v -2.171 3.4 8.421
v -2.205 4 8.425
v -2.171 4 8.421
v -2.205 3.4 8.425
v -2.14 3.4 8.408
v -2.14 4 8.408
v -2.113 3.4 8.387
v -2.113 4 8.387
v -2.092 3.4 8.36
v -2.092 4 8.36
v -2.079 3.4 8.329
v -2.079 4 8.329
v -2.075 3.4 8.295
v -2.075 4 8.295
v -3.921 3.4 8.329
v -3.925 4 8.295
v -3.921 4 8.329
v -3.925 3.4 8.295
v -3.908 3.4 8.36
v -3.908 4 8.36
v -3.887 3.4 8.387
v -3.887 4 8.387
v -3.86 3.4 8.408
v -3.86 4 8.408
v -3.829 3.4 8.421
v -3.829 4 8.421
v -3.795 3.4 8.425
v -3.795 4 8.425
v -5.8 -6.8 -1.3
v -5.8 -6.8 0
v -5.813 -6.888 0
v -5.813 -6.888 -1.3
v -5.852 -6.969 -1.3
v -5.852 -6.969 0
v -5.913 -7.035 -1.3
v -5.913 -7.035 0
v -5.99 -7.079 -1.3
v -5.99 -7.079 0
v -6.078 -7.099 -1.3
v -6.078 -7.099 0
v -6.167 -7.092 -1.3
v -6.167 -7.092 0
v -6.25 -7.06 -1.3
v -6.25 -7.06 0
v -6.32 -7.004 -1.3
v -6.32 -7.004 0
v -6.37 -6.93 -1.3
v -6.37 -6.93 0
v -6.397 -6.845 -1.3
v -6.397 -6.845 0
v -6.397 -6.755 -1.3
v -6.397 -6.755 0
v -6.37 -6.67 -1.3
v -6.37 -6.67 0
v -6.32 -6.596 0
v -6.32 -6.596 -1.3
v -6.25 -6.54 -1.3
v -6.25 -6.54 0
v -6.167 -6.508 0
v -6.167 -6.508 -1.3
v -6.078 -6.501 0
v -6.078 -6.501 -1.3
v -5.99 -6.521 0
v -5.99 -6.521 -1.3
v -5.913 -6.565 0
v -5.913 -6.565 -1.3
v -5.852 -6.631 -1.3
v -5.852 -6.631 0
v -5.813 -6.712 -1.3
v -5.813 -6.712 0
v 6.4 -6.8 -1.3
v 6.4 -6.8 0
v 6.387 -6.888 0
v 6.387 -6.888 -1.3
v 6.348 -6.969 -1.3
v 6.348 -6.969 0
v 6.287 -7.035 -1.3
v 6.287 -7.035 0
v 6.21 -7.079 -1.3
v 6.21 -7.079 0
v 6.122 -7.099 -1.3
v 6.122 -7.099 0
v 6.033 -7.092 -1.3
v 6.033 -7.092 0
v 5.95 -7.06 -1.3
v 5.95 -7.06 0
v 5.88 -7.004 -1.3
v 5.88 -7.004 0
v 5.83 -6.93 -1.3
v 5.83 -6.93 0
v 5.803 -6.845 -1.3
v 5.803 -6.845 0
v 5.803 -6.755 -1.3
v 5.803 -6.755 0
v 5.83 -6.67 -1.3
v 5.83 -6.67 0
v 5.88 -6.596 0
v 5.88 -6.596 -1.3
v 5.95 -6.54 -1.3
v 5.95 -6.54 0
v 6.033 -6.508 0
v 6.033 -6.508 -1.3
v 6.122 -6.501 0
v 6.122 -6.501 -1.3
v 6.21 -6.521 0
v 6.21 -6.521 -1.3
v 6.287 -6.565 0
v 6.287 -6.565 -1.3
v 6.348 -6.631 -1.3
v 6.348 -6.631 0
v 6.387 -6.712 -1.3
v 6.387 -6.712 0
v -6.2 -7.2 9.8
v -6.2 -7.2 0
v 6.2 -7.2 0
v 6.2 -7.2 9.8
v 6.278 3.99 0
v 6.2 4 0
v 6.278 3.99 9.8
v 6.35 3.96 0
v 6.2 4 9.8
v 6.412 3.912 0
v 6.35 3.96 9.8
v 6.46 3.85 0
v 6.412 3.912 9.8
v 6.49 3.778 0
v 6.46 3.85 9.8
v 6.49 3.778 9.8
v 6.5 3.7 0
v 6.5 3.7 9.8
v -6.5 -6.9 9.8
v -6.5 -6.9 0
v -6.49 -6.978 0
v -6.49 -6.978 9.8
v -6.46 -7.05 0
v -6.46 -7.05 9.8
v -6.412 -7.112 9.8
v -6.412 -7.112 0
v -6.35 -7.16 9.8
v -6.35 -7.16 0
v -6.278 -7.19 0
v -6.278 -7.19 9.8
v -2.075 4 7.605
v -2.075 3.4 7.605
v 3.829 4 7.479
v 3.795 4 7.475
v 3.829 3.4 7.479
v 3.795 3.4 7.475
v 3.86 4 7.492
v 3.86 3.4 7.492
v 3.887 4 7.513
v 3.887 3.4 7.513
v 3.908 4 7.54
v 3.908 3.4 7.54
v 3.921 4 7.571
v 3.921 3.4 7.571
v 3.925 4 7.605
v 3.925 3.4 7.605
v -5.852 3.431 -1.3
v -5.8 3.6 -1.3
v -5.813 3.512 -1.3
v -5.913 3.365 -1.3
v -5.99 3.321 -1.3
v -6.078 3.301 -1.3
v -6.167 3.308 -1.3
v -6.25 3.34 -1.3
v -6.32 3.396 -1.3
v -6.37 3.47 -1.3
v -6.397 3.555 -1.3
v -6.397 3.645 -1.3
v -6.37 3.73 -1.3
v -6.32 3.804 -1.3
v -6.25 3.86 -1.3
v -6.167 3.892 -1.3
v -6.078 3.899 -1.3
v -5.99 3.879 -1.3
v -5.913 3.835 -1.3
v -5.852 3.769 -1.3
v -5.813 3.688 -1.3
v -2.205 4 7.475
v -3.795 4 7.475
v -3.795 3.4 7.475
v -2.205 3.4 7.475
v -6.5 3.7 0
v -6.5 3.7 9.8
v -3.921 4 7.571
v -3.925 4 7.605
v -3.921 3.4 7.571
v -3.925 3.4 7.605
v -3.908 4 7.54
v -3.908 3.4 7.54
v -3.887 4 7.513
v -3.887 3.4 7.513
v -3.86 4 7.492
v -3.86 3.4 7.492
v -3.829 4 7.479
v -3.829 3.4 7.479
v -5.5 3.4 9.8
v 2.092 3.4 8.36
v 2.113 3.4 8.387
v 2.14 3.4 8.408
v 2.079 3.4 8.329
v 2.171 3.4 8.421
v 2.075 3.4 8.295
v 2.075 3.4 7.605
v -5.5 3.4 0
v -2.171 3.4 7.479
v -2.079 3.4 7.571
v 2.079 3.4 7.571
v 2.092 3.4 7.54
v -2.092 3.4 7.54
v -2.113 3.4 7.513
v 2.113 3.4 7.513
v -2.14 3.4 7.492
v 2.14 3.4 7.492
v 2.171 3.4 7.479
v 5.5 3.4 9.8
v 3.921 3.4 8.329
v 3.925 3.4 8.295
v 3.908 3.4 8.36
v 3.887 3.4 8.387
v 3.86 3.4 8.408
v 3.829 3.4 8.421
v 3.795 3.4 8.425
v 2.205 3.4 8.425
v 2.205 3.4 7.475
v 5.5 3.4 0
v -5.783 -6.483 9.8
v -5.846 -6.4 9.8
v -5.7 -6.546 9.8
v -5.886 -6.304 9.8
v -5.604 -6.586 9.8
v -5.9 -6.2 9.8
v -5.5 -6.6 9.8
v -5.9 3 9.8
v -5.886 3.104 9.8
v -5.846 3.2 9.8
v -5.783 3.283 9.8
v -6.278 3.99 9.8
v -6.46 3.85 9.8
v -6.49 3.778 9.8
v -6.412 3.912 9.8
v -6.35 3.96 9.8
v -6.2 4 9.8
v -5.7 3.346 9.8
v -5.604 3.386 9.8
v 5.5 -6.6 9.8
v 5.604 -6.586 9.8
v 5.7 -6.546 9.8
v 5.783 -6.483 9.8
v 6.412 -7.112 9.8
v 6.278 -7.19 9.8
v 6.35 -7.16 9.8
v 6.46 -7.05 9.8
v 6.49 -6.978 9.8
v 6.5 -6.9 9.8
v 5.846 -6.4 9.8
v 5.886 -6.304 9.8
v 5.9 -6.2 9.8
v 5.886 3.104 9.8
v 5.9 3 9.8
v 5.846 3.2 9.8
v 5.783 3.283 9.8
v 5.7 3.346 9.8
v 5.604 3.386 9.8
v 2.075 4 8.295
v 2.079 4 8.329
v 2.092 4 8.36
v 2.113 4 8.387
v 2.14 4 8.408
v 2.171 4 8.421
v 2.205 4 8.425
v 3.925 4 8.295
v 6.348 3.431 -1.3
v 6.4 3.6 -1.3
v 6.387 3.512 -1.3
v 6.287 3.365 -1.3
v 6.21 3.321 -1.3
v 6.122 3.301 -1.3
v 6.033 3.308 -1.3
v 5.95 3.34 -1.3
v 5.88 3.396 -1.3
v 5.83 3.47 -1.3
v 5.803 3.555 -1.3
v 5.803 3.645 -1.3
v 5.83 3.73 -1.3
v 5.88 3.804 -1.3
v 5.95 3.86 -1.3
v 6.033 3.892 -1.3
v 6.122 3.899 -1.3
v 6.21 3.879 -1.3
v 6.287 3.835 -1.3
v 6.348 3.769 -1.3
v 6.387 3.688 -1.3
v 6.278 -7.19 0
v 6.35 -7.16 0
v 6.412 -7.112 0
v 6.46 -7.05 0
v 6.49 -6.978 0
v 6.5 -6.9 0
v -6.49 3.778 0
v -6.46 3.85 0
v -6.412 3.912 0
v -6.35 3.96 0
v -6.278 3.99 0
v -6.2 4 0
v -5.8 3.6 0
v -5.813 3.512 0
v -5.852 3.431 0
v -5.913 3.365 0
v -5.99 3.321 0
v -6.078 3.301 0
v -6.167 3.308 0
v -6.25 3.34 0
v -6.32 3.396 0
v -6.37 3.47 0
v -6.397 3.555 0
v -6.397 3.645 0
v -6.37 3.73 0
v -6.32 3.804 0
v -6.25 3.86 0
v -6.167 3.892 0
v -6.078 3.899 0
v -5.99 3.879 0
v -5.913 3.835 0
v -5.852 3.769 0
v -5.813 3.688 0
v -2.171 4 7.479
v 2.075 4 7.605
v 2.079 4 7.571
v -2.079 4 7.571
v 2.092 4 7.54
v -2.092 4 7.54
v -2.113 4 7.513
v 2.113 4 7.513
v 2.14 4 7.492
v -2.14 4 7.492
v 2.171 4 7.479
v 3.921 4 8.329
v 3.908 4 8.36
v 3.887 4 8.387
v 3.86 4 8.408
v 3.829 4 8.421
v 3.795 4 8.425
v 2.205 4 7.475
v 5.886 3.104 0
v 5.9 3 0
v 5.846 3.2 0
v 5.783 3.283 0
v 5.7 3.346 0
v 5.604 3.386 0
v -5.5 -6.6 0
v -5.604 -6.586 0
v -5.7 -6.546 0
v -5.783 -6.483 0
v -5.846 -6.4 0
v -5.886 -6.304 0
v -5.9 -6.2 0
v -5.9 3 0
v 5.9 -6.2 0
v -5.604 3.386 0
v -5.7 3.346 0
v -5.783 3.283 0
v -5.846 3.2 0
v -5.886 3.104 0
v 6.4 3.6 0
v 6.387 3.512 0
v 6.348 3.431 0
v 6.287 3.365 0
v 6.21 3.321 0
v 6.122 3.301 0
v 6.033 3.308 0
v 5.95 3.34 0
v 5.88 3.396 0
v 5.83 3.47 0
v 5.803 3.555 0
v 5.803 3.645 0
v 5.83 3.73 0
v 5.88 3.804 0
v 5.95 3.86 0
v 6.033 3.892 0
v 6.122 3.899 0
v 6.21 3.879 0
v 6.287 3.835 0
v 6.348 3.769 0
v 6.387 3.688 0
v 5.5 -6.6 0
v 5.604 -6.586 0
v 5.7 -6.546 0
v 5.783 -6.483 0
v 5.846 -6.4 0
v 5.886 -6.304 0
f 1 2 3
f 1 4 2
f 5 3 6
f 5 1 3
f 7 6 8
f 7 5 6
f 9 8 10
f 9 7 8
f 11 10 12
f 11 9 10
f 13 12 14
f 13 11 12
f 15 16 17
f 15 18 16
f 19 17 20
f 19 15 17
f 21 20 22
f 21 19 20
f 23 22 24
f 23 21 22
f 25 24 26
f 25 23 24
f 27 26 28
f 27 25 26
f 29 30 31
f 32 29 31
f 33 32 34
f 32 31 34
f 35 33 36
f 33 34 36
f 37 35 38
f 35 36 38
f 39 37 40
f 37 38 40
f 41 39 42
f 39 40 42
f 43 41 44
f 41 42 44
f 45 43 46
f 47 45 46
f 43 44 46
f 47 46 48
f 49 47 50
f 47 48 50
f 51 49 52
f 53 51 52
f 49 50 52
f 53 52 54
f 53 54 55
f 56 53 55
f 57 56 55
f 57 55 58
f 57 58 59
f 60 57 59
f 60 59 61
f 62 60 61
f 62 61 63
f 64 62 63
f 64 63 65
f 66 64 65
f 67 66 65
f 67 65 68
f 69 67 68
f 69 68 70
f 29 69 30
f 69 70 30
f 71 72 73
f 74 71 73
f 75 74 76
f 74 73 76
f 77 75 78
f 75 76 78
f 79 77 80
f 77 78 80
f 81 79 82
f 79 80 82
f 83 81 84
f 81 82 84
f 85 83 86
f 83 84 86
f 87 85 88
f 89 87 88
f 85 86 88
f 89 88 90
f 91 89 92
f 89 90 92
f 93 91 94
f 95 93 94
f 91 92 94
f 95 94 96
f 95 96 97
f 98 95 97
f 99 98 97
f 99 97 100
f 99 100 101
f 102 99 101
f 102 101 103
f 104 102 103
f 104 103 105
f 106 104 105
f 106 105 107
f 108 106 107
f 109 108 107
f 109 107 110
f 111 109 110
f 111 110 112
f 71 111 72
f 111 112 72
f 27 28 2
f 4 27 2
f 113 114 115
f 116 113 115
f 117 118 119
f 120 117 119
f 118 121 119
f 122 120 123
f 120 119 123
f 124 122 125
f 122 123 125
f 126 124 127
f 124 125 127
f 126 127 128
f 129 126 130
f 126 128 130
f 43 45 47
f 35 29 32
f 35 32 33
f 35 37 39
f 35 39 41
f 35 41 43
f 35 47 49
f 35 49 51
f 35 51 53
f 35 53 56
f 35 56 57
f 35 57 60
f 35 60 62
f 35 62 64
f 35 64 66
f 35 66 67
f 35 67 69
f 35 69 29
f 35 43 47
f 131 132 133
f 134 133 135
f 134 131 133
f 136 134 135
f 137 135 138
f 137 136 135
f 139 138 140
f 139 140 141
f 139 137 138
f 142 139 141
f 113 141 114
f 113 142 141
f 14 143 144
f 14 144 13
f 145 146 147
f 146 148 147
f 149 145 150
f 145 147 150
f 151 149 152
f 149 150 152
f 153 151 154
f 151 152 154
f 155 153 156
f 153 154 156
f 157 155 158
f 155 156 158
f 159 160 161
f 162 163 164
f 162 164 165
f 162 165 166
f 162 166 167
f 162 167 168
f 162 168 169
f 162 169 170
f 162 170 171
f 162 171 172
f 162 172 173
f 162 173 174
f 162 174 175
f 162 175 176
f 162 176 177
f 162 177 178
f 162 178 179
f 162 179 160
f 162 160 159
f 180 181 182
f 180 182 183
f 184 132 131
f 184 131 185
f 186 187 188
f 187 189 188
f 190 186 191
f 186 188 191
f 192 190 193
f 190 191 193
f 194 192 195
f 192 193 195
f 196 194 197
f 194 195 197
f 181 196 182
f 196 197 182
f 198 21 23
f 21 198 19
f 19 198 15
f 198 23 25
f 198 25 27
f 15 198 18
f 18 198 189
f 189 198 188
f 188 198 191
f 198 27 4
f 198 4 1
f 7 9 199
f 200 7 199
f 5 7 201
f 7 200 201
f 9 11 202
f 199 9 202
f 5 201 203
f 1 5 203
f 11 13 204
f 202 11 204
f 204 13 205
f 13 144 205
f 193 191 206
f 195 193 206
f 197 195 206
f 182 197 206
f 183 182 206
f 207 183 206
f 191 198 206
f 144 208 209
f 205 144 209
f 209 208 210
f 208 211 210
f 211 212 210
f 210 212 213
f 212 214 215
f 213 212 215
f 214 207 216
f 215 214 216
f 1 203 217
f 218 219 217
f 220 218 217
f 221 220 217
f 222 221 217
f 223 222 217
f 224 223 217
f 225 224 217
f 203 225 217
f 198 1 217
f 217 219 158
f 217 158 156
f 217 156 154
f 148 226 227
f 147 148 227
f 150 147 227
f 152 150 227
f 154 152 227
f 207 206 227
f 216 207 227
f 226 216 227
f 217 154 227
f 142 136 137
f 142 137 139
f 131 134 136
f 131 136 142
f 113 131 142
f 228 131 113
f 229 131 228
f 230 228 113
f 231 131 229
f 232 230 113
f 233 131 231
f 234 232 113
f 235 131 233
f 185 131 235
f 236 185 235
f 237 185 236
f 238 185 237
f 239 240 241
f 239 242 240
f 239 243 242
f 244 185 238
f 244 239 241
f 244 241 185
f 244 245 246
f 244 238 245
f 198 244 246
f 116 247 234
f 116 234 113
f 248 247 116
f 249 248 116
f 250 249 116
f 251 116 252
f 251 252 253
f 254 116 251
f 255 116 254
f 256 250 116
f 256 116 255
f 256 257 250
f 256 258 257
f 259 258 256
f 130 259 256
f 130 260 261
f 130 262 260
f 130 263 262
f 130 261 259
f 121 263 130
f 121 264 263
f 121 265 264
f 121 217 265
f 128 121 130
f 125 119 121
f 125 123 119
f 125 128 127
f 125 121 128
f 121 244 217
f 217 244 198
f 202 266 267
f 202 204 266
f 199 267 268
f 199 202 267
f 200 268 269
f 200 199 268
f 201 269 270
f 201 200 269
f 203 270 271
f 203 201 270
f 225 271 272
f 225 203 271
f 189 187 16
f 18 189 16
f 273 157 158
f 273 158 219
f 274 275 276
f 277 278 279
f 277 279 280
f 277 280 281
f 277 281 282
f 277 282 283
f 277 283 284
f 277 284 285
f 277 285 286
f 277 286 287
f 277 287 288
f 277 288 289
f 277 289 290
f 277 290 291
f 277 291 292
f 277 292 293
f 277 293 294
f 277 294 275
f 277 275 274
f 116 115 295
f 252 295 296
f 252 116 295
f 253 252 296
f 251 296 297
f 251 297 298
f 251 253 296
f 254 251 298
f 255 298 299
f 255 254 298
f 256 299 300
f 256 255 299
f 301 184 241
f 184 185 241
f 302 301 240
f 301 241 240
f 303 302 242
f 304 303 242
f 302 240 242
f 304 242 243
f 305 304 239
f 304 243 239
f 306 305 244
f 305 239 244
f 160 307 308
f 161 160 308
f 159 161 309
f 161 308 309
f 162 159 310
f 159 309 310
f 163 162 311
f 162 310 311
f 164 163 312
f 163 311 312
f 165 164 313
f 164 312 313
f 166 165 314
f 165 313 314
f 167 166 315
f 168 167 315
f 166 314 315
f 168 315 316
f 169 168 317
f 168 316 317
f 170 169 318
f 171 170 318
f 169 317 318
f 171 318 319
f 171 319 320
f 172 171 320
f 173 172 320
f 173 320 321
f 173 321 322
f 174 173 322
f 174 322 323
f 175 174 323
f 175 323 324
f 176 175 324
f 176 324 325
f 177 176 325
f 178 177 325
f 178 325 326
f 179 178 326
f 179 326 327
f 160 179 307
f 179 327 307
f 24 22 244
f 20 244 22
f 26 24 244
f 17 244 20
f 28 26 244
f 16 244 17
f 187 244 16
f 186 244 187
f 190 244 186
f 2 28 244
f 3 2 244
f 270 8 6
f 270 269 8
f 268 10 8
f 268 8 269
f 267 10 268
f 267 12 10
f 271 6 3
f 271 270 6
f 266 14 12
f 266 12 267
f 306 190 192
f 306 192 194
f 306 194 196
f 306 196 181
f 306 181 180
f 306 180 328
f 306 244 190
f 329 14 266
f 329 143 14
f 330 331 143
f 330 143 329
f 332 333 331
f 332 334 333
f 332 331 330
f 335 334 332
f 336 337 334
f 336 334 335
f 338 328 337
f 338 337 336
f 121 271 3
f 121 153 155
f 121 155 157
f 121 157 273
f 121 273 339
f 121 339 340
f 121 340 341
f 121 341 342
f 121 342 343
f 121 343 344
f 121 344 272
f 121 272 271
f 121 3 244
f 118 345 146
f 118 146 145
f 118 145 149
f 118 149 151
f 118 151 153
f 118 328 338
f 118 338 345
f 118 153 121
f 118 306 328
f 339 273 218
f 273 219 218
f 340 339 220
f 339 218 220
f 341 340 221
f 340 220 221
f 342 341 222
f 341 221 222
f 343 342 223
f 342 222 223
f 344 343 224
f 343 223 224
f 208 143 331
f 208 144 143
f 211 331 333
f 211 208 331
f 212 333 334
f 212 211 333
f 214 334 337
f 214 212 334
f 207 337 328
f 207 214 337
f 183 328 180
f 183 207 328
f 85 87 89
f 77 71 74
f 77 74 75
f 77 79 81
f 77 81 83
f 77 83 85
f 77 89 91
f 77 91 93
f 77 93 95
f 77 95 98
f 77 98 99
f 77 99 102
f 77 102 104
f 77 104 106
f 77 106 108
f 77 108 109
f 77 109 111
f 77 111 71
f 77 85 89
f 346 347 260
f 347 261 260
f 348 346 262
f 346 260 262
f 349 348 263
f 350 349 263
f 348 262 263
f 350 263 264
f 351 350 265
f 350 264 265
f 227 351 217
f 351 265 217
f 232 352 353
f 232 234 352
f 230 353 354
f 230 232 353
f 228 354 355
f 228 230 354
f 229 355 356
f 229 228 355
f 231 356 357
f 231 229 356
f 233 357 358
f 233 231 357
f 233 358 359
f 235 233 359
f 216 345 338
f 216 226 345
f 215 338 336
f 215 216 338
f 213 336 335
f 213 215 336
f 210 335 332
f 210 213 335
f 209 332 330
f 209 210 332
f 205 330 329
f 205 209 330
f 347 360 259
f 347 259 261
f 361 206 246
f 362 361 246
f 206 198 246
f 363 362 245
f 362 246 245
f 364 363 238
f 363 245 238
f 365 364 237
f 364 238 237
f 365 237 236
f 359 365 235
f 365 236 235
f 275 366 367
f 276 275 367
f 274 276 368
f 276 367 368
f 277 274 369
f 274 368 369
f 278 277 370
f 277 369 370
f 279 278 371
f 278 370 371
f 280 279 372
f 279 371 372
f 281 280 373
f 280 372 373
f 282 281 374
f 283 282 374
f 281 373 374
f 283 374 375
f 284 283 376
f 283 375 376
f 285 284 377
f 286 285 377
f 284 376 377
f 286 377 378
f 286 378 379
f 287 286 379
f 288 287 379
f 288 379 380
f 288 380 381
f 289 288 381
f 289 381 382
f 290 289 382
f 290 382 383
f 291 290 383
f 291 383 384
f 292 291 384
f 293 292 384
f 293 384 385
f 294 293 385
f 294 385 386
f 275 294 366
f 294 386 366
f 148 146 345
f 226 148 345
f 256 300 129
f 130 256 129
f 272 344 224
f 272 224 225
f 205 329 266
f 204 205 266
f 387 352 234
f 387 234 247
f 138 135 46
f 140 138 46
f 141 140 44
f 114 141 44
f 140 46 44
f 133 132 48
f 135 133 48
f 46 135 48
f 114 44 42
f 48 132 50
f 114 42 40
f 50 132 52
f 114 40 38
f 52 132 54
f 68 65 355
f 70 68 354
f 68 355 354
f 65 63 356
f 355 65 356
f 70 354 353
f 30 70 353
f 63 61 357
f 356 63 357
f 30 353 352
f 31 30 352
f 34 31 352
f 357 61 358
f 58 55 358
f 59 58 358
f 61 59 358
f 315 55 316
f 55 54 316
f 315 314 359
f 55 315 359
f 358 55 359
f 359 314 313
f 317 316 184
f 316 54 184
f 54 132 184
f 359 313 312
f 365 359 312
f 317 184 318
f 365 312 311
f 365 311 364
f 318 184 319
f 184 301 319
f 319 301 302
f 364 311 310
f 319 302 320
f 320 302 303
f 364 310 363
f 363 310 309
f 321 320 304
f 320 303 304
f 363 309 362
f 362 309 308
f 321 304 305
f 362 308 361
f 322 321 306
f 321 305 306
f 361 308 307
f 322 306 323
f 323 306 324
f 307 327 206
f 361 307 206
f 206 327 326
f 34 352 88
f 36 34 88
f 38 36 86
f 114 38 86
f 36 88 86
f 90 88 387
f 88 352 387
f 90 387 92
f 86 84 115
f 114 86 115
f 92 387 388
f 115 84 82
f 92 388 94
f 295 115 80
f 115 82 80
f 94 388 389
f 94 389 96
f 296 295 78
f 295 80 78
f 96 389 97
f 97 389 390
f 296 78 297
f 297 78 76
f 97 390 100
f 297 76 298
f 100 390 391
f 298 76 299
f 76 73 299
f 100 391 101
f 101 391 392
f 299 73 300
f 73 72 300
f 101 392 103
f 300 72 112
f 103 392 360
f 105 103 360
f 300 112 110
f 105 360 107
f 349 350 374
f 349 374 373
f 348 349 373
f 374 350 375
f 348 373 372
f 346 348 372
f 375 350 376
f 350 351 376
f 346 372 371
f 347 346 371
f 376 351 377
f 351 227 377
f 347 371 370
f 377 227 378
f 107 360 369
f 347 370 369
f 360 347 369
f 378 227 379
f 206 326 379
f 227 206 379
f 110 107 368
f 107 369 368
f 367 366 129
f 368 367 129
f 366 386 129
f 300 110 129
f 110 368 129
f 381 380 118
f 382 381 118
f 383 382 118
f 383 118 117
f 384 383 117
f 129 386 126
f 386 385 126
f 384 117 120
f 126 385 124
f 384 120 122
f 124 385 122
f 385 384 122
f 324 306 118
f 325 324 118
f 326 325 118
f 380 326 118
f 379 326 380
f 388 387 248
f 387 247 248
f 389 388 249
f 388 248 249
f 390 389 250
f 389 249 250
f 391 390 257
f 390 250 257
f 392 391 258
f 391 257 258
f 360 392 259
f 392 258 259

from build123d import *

# Parameters (mm, degrees)
SKETCH005_W     = 13
SKETCH005_H     = 11.2
SKETCH005_W_2   = 11.8
SKETCH005_H_2   = 10
PAD003_DEPTH    = 9.8
FILLET005_R     = 0.3
FILLET006_R     = 0.4
SKETCH006_W     = 1.85
SKETCH006_H     = 0.95
POCKET002_DEPTH = 0.6
FILLET007_R     = 0.13
SKETCH007_R     = 0.3
PAD004_DEPTH    = 1.3


with BuildPart() as part:
    # Sketch005 → Pad003 (new body)
    with BuildSketch(Plane.XY):
        with Locations((0, -1.6)):
            Rectangle(SKETCH005_W, SKETCH005_H)
        with Locations((0, -1.6)):
            Rectangle(SKETCH005_W_2, SKETCH005_H_2, mode=Mode.SUBTRACT)
    extrude(amount=PAD003_DEPTH)

    # Fillet005
    fillet005_edges = [part.edges().sort_by_distance(p)[0] for p in [
        (-6.5, 4, 4.9),
        (-6.5, -7.2, 4.9),
        (6.5, -7.2, 4.9),
        (6.5, 4, 4.9),
    ]]
    fillet(fillet005_edges, radius=FILLET005_R)

    # Fillet006
    fillet006_edges = [part.edges().sort_by_distance(p)[0] for p in [
        (-5.9, -6.6, 4.9),
        (-5.9, 3.4, 4.9),
        (5.9, -6.6, 4.9),
        (5.9, 3.4, 4.9),
    ]]
    fillet(fillet006_edges, radius=FILLET006_R)

    # Sketch006 (on Face10 of Fillet006) → Pocket002 (cut)
    with BuildSketch(Plane(origin=(0, 4, 0), x_dir=(-1, 0, 0), z_dir=(0, 1, 0))):
        with Locations((-3, 7.95)):
            Rectangle(SKETCH006_W, SKETCH006_H)
    pocket002 = extrude(amount=-POCKET002_DEPTH, mode=Mode.SUBTRACT)

    # Mirrored001: Pocket002 across Sketch006 V_Axis
    add(pocket002.mirror(Plane(origin=(0, 4, 0), x_dir=(0, 1, 0), z_dir=(-1, 0, 0))), mode=Mode.SUBTRACT)

    # Fillet007
    fillet007_edges = [part.edges().sort_by_distance(p)[0] for p in [
        (2.075, 3.7, 8.425),
        (2.075, 3.7, 7.475),
        (-3.925, 3.7, 7.475),
        (-3.925, 3.7, 8.425),
        (-2.075, 3.7, 8.425),
        (-2.075, 3.7, 7.475),
        (3.925, 3.7, 7.475),
        (3.925, 3.7, 8.425),
    ]]
    fillet(fillet007_edges, radius=FILLET007_R)

    # Sketch007 (on Face10 of Fillet007) → Pad004 (join)
    with BuildSketch(Plane(origin=(0, 0, 0), x_dir=(1, 0, 0), z_dir=(0, 0, -1))):
        with Locations((-6.1, 6.8)):
            Circle(SKETCH007_R)
        with Locations((6.1, 6.8)):
            Circle(SKETCH007_R)
        with Locations((-6.1, -3.6)):
            Circle(SKETCH007_R)
        with Locations((6.1, -3.6)):
            Circle(SKETCH007_R)
    extrude(amount=PAD004_DEPTH)


solid = part.part
